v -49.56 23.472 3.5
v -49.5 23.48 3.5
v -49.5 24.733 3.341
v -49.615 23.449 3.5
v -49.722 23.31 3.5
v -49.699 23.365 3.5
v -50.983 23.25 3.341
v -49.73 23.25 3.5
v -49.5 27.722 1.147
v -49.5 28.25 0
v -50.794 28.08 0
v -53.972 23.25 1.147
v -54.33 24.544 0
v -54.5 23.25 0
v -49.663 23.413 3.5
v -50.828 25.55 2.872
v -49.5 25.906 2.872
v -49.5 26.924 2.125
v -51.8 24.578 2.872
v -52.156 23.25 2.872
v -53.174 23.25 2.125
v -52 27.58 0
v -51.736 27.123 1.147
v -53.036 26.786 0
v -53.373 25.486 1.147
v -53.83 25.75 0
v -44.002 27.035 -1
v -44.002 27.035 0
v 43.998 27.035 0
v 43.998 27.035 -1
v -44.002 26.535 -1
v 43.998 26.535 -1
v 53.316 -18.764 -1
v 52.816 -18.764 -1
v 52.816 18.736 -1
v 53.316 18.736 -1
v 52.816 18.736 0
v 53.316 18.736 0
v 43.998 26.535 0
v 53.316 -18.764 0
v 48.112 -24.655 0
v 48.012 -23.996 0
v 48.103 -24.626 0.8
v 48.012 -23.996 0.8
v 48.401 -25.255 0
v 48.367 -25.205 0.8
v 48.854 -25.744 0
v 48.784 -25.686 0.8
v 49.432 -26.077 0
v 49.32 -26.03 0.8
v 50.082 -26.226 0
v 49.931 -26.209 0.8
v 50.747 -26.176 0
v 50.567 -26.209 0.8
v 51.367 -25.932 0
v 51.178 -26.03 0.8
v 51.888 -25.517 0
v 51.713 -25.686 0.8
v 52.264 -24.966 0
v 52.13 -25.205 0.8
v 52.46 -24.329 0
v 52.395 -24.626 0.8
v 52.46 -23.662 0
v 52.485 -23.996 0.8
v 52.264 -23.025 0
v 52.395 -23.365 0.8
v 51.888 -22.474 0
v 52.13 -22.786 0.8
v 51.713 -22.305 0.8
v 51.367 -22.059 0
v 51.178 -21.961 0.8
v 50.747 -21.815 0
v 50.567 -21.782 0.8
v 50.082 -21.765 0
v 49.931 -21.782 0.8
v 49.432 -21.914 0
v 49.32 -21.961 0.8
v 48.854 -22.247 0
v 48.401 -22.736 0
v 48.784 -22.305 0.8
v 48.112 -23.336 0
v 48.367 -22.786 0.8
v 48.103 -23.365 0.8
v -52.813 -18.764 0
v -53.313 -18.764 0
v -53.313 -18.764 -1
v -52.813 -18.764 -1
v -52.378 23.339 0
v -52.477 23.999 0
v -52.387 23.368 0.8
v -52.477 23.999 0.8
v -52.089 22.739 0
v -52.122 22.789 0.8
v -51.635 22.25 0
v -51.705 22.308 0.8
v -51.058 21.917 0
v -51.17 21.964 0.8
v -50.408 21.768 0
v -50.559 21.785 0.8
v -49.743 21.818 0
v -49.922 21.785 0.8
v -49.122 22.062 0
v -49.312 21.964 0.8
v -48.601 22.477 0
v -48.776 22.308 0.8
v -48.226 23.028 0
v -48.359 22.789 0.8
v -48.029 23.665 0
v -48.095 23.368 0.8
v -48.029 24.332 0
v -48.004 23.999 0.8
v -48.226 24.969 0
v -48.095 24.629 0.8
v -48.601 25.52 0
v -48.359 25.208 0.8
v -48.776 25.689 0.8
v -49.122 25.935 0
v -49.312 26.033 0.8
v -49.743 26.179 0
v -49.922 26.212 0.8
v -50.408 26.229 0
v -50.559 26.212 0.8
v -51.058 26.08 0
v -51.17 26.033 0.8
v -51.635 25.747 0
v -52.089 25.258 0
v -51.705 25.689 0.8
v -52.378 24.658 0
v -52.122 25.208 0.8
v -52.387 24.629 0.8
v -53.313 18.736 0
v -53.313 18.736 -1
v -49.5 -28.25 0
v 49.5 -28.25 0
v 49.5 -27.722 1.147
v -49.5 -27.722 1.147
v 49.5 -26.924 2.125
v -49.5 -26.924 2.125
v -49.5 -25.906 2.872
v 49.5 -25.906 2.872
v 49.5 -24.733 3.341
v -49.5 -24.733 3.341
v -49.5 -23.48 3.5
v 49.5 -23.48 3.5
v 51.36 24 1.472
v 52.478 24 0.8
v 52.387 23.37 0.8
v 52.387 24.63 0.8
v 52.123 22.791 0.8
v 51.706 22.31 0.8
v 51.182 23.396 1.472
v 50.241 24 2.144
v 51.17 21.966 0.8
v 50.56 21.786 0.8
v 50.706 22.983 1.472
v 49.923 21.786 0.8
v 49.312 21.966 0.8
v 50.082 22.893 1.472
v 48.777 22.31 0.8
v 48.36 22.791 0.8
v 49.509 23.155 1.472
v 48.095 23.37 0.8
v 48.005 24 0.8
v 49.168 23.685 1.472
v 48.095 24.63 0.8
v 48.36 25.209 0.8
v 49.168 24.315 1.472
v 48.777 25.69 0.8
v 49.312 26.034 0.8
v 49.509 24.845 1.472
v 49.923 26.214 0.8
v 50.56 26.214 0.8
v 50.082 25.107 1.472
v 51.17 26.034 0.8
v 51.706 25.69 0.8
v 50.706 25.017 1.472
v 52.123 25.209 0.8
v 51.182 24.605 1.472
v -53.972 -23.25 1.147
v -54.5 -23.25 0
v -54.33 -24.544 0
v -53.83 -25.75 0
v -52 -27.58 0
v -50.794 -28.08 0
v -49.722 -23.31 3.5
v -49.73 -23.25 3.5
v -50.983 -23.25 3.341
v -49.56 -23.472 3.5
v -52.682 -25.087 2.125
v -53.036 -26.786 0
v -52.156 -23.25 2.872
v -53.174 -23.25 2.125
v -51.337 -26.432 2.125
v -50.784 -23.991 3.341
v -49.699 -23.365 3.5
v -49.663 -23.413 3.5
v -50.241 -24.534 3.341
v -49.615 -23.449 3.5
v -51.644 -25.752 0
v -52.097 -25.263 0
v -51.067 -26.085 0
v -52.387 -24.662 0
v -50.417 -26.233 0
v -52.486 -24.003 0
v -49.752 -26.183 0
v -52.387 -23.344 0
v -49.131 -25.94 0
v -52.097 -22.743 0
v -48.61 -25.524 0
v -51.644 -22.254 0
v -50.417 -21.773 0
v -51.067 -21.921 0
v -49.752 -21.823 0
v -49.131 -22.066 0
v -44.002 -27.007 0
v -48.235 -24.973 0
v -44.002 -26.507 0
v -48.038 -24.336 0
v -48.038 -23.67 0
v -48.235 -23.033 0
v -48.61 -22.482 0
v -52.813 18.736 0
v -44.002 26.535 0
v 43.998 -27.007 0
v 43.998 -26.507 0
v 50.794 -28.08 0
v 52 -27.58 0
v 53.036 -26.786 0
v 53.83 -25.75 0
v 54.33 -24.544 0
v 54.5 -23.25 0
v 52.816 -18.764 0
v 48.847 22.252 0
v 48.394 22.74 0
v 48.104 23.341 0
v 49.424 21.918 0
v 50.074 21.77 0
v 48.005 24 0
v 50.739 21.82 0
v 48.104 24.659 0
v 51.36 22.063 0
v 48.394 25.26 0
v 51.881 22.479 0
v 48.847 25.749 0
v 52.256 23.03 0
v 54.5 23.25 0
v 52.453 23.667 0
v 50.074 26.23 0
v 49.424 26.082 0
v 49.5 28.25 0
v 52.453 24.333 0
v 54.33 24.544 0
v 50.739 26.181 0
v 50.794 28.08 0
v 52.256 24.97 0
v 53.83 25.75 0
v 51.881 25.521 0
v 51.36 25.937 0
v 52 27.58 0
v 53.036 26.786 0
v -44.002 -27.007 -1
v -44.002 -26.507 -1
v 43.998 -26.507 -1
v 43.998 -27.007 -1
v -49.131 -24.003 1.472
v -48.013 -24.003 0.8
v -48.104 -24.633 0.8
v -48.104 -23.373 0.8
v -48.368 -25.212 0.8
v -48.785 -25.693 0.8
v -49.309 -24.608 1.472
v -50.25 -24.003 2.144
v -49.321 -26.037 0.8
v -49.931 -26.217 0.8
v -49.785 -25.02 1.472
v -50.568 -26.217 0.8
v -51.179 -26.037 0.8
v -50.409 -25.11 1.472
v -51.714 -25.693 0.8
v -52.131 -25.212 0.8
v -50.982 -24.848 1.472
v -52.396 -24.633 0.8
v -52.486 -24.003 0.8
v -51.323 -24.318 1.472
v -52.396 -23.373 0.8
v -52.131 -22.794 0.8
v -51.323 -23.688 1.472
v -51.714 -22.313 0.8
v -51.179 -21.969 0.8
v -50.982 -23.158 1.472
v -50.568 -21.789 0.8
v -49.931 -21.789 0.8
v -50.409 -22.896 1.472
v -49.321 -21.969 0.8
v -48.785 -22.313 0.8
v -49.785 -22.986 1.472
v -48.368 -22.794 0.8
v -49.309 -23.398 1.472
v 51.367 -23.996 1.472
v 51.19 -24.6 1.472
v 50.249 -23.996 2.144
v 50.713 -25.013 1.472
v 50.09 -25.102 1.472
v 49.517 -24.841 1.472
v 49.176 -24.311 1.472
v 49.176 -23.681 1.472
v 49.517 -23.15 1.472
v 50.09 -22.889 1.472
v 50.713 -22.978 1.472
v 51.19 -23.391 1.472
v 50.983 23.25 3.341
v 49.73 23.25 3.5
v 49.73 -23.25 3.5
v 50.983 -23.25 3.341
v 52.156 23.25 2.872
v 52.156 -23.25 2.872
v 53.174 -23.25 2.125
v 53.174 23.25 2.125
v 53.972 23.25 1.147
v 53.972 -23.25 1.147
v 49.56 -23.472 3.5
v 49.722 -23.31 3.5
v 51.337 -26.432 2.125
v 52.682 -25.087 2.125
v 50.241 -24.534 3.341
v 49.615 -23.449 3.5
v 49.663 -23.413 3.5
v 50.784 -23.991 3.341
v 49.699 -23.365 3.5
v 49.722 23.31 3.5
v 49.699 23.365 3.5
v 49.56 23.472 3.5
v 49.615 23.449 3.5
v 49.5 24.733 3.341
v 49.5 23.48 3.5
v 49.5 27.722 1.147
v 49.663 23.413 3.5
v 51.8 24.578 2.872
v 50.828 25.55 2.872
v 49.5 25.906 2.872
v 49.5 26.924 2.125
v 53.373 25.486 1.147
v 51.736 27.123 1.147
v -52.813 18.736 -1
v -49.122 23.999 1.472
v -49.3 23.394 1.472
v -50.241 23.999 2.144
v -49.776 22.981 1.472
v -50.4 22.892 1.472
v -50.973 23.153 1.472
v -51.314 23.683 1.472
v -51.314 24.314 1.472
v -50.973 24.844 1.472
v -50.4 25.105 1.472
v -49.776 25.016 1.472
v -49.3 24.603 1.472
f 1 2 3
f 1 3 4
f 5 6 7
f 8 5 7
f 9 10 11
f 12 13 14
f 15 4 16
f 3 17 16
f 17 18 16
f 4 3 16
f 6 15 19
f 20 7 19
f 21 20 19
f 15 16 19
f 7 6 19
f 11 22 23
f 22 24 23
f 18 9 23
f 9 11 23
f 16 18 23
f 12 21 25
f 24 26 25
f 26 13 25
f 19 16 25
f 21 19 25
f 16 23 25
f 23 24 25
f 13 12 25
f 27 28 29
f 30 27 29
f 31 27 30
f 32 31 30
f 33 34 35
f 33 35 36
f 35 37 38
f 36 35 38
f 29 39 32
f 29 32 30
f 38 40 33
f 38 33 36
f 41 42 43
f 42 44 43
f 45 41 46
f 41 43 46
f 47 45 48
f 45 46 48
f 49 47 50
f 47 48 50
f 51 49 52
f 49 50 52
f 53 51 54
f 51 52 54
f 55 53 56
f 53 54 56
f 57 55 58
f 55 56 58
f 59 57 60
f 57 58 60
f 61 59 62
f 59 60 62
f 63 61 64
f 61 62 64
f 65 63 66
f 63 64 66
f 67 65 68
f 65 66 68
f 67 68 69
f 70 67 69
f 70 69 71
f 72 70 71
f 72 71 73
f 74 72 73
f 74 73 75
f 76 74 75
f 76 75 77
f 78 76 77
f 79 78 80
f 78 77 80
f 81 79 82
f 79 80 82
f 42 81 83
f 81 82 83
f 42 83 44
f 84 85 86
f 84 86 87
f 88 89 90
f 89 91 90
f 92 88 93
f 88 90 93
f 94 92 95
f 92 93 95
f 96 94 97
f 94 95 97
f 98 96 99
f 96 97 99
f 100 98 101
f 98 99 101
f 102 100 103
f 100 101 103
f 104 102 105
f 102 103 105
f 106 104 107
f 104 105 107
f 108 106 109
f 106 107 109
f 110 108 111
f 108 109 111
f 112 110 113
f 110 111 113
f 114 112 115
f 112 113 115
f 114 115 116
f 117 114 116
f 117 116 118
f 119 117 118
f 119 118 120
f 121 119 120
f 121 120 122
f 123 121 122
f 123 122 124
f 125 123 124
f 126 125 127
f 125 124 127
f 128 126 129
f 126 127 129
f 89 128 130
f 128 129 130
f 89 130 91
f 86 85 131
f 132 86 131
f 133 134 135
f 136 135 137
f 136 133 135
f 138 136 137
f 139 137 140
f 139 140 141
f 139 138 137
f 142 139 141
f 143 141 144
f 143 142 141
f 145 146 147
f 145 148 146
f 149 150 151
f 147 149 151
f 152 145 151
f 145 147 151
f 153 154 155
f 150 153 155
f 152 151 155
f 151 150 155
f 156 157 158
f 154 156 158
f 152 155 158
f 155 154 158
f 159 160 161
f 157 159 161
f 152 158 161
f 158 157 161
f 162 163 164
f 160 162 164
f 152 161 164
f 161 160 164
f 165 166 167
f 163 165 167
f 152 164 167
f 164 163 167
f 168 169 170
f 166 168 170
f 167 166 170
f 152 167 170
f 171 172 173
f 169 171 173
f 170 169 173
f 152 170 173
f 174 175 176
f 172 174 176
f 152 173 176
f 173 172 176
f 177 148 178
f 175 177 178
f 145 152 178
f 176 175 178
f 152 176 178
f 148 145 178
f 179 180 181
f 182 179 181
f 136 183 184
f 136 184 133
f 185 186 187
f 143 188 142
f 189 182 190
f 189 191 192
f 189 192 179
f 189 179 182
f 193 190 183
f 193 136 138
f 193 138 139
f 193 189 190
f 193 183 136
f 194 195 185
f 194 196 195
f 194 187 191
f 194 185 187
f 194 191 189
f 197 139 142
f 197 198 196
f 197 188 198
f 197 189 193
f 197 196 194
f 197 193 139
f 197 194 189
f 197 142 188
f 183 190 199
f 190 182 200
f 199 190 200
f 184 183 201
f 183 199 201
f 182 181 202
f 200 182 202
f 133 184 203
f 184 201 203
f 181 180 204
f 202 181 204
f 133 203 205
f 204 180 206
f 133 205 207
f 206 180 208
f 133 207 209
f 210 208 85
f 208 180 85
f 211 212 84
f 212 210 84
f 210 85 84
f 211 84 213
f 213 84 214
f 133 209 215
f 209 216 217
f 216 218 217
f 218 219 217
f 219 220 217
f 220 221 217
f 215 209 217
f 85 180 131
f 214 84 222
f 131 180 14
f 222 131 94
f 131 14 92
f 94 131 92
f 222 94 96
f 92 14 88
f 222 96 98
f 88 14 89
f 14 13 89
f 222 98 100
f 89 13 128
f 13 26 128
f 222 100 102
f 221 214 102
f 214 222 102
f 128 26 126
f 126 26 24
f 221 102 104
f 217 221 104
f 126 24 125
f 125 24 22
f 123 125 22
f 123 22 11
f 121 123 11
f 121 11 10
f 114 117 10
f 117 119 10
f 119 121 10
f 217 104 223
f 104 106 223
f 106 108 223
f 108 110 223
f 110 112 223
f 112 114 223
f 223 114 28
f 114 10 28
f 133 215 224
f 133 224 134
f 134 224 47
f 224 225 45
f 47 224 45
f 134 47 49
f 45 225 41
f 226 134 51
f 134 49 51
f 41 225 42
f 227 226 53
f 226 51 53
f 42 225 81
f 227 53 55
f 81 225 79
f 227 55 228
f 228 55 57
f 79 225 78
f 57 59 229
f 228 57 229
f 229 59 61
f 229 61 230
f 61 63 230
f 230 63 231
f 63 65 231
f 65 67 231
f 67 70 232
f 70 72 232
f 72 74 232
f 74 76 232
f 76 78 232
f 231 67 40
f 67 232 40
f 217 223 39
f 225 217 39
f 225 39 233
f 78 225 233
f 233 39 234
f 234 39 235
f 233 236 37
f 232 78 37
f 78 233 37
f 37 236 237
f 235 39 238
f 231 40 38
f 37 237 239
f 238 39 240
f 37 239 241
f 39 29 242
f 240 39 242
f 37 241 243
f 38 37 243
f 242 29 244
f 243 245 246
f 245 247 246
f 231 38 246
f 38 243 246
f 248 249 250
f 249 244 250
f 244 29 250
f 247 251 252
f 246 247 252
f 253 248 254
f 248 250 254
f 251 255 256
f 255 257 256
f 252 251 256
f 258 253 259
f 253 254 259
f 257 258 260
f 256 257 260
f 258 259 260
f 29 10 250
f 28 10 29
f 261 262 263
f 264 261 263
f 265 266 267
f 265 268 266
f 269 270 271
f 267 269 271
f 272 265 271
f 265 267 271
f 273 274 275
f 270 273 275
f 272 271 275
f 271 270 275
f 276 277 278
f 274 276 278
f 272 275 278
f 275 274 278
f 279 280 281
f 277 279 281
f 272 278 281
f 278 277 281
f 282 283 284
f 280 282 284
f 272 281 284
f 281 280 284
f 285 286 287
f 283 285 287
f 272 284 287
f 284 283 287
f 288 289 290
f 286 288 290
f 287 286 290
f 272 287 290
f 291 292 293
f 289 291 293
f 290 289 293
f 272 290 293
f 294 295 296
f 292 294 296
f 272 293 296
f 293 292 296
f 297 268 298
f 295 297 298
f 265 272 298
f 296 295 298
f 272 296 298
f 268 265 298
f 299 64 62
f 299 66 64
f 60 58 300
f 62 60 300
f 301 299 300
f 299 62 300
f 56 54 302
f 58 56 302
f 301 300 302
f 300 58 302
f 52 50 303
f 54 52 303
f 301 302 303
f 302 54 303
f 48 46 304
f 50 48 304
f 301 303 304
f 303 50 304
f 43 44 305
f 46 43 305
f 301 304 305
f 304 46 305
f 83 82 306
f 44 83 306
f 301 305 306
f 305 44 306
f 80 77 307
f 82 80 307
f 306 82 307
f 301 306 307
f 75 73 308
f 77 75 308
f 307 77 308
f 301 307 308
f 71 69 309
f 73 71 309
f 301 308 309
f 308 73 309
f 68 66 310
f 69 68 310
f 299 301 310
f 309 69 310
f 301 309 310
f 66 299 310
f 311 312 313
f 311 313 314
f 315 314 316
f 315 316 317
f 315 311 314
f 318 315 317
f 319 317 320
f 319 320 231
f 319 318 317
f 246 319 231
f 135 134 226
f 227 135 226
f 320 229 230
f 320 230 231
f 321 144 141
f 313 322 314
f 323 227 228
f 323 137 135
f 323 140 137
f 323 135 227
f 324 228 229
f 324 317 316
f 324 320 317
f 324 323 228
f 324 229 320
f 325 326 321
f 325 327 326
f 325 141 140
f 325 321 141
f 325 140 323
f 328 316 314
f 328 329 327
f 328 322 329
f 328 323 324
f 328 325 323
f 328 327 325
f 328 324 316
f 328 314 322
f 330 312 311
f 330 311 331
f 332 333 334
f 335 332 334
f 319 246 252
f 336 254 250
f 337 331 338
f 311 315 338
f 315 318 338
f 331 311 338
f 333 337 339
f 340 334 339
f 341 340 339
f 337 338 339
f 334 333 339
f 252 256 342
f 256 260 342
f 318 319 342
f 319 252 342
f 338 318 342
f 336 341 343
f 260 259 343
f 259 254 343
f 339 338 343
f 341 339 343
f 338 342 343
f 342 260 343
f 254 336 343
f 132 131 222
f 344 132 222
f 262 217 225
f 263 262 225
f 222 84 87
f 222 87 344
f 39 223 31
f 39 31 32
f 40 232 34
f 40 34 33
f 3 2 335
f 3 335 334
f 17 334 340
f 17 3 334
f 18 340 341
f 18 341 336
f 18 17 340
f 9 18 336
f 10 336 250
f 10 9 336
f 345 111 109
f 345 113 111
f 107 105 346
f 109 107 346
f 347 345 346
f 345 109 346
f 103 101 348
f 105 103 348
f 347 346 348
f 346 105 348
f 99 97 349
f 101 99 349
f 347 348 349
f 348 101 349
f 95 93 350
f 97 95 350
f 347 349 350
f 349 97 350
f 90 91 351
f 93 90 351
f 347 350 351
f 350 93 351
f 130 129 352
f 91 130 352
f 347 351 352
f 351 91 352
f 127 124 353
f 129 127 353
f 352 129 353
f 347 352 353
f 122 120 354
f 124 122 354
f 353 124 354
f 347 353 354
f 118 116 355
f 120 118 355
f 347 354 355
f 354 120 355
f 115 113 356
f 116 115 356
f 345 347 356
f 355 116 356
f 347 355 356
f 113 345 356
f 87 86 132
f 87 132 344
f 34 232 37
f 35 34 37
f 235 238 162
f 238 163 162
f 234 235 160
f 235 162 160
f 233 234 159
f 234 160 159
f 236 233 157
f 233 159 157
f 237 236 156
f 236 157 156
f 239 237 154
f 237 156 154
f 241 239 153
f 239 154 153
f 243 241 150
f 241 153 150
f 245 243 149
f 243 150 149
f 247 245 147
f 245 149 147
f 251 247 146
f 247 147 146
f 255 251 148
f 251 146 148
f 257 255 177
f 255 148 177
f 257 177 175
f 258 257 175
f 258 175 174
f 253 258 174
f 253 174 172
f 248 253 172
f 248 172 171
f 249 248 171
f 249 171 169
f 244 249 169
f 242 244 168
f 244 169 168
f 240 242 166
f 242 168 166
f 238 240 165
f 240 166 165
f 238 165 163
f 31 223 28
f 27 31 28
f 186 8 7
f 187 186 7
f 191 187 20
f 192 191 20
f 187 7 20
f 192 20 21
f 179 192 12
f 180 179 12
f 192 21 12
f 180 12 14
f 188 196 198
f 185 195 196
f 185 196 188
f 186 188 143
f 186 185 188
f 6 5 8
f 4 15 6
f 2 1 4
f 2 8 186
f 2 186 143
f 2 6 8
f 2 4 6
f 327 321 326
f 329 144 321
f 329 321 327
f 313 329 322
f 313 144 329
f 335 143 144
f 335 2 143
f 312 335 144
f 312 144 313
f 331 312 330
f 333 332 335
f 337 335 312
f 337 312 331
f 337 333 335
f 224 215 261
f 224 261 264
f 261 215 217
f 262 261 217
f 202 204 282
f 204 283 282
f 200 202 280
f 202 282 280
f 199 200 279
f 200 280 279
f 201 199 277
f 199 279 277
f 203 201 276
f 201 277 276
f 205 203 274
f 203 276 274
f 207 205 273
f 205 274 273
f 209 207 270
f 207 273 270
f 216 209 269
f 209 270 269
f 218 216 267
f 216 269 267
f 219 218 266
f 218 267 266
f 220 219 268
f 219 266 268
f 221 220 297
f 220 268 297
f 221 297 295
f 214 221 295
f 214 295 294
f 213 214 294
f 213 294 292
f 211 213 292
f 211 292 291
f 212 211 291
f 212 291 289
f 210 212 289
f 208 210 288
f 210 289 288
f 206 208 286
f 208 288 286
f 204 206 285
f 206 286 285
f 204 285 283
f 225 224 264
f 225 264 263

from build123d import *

# Parameters (mm, degrees)
F1_DEPTH     = 3.5
F5_D         = 4.473
F5_DEPTH     = 0.8
F5_TIP       = 1.3438247745
F6_T1_DEPTH  = 99
F6_T3_DEPTH  = 46.5
F6_T6_ANGLE  = 90
F6_T8_ANGLE  = 90
F6_T10_ANGLE = 90
F6_T12_ANGLE = 90
F8_W         = 0.5
F8_H         = 37.5
F8_W_2       = 88
F8_H_2       = 0.5
F9_DEPTH     = 1


# Not quite as in the source:
# - a fillet or chamfer that OpenCascade refuses, or shapes differently, is made with other operations: its cross-section is extruded or revolved along the edge and cut away or added


with BuildPart() as f1:
    # F0 (on Top) → F1 (new body)
    with BuildSketch(Plane.XY):
        with BuildLine():
            Line((-49.5, -28.25), (49.5, -28.25))
            ThreePointArc((49.5, -28.25), (53.0355339059, -26.7855339059), (54.5, -23.25))
            Line((54.5, -23.25), (54.5, 23.25))
            ThreePointArc((54.5, 23.25), (53.0355339059, 26.7855339059), (49.5, 28.25))
            Line((49.5, 28.25), (-49.5, 28.25))
            ThreePointArc((-49.5, 28.25), (-53.0355339059, 26.7855339059), (-54.5, 23.25))
            Line((-54.5, 23.25), (-54.5, -23.25))
            ThreePointArc((-54.5, -23.25), (-53.0355339059, -26.7855339059), (-49.5, -28.25))
        make_face()
    extrude(amount=F1_DEPTH)

    # F5
    with Locations(Plane(origin=(0, 0, 0), x_dir=(1, 0, 0), z_dir=(0, 0, -1))):
        with Locations((-50.2406740561, -23.9985361695), (-50.2495961264, 24.0030474961), (50.2488752827, 23.995583877), (50.2413948998, -24.0000952035)):
            Hole(F5_D / 2, depth=F5_DEPTH)
            with Locations((0, 0, -(F5_DEPTH + F5_TIP / 2))):  # 118° drill point
                Cone(0, F5_D / 2, F5_TIP, mode=Mode.SUBTRACT)

    # F6: fillet of radius 5 on 1 edges, made by hand

    # F6_s2 → F6_t1 (cut)
    with BuildSketch(Plane.YZ.offset(-49.5)):
        with BuildLine():
            ThreePointArc((-28.25, 0), (-26.4383438845, 2.5311288741), (-23.4803039929, 3.5))
            Line((-23.4803039929, 3.5), (-28.25, 3.5))
            Line((-28.25, 3.5), (-28.25, 0))
        make_face()
        with BuildLine():
            ThreePointArc((23.4803039929, 3.5), (26.4383438845, 2.5311288741), (28.25, 0))
            Line((28.25, 0), (28.25, 3.5))
            Line((28.25, 3.5), (23.4803039929, 3.5))
        make_face()
    extrude(amount=F6_T1_DEPTH, mode=Mode.SUBTRACT)

    # F6_s4 → F6_t3 (cut)
    with BuildSketch(Plane.XZ.offset(-23.25)):
        with BuildLine():
            ThreePointArc((49.7303039929, 3.5), (52.6883438845, 2.5311288741), (54.5, 0))
            Line((54.5, 0), (54.5, 3.5))
            Line((54.5, 3.5), (49.7303039929, 3.5))
        make_face()
        with BuildLine():
            ThreePointArc((-49.7303039929, 3.5), (-52.6883438845, 2.5311288741), (-54.5, 0))
            Line((-54.5, 0), (-54.5, 3.5))
            Line((-54.5, 3.5), (-49.7303039929, 3.5))
        make_face()
    extrude(amount=F6_T3_DEPTH, mode=Mode.SUBTRACT)

    # F6_s5 → F6_t6 (revolve, cut)
    with BuildSketch(Plane.XZ.offset(23.25)):
        with BuildLine():
            ThreePointArc((-54.5, 0), (-52.6883438845, 2.5311288741), (-49.7303039929, 3.5))
            Line((-49.7303039929, 3.5), (-54.5, 3.5))
            Line((-54.5, 3.5), (-54.5, 0))
        make_face()
    revolve(axis=Axis((-49.5, -23.25, 3.5), (0, 0, 1)), revolution_arc=F6_T6_ANGLE, mode=Mode.SUBTRACT)

    # F6_s7 → F6_t8 (revolve, cut)
    with BuildSketch(Plane.YZ.offset(49.5)):
        with BuildLine():
            ThreePointArc((-28.25, 0), (-26.4383438845, 2.5311288741), (-23.4803039929, 3.5))
            Line((-23.4803039929, 3.5), (-28.25, 3.5))
            Line((-28.25, 3.5), (-28.25, 0))
        make_face()
    revolve(axis=Axis((49.5, -23.25, 3.5), (0, 0, 1)), revolution_arc=F6_T8_ANGLE, mode=Mode.SUBTRACT)

    # F6_s9 → F6_t10 (revolve, cut)
    with BuildSketch(Plane.XZ.offset(-23.25)):
        with BuildLine():
            ThreePointArc((49.7303039929, 3.5), (52.6883438845, 2.5311288741), (54.5, 0))
            Line((54.5, 0), (54.5, 3.5))
            Line((54.5, 3.5), (49.7303039929, 3.5))
        make_face()
    revolve(axis=Axis((49.5, 23.25, 3.5), (0, 0, 1)), revolution_arc=F6_T10_ANGLE, mode=Mode.SUBTRACT)

    # F6_s11 → F6_t12 (revolve, cut)
    with BuildSketch(Plane.YZ.offset(-49.5)):
        with BuildLine():
            ThreePointArc((23.4803039929, 3.5), (26.4383438845, 2.5311288741), (28.25, 0))
            Line((28.25, 0), (28.25, 3.5))
            Line((28.25, 3.5), (23.4803039929, 3.5))
        make_face()
    revolve(axis=Axis((-49.5, 23.25, 3.5), (0, 0, 1)), revolution_arc=F6_T12_ANGLE, mode=Mode.SUBTRACT)

    # F8 (on Top) → F9 (join)
    with BuildSketch(Plane.XY):
        with Locations((-53.0630070642, -0.0139670707)):
            Rectangle(F8_W, F8_H)
        with Locations((-0.0016481951, -26.7570052035)):
            Rectangle(F8_W_2, F8_H_2)
        with Locations((53.0663034543, -0.0139678158)):
            Rectangle(F8_W, F8_H)
        with Locations((-0.0016481951, 26.78494009)):
            Rectangle(F8_W_2, F8_H_2)
    extrude(amount=-F9_DEPTH)


solid = f1.part
